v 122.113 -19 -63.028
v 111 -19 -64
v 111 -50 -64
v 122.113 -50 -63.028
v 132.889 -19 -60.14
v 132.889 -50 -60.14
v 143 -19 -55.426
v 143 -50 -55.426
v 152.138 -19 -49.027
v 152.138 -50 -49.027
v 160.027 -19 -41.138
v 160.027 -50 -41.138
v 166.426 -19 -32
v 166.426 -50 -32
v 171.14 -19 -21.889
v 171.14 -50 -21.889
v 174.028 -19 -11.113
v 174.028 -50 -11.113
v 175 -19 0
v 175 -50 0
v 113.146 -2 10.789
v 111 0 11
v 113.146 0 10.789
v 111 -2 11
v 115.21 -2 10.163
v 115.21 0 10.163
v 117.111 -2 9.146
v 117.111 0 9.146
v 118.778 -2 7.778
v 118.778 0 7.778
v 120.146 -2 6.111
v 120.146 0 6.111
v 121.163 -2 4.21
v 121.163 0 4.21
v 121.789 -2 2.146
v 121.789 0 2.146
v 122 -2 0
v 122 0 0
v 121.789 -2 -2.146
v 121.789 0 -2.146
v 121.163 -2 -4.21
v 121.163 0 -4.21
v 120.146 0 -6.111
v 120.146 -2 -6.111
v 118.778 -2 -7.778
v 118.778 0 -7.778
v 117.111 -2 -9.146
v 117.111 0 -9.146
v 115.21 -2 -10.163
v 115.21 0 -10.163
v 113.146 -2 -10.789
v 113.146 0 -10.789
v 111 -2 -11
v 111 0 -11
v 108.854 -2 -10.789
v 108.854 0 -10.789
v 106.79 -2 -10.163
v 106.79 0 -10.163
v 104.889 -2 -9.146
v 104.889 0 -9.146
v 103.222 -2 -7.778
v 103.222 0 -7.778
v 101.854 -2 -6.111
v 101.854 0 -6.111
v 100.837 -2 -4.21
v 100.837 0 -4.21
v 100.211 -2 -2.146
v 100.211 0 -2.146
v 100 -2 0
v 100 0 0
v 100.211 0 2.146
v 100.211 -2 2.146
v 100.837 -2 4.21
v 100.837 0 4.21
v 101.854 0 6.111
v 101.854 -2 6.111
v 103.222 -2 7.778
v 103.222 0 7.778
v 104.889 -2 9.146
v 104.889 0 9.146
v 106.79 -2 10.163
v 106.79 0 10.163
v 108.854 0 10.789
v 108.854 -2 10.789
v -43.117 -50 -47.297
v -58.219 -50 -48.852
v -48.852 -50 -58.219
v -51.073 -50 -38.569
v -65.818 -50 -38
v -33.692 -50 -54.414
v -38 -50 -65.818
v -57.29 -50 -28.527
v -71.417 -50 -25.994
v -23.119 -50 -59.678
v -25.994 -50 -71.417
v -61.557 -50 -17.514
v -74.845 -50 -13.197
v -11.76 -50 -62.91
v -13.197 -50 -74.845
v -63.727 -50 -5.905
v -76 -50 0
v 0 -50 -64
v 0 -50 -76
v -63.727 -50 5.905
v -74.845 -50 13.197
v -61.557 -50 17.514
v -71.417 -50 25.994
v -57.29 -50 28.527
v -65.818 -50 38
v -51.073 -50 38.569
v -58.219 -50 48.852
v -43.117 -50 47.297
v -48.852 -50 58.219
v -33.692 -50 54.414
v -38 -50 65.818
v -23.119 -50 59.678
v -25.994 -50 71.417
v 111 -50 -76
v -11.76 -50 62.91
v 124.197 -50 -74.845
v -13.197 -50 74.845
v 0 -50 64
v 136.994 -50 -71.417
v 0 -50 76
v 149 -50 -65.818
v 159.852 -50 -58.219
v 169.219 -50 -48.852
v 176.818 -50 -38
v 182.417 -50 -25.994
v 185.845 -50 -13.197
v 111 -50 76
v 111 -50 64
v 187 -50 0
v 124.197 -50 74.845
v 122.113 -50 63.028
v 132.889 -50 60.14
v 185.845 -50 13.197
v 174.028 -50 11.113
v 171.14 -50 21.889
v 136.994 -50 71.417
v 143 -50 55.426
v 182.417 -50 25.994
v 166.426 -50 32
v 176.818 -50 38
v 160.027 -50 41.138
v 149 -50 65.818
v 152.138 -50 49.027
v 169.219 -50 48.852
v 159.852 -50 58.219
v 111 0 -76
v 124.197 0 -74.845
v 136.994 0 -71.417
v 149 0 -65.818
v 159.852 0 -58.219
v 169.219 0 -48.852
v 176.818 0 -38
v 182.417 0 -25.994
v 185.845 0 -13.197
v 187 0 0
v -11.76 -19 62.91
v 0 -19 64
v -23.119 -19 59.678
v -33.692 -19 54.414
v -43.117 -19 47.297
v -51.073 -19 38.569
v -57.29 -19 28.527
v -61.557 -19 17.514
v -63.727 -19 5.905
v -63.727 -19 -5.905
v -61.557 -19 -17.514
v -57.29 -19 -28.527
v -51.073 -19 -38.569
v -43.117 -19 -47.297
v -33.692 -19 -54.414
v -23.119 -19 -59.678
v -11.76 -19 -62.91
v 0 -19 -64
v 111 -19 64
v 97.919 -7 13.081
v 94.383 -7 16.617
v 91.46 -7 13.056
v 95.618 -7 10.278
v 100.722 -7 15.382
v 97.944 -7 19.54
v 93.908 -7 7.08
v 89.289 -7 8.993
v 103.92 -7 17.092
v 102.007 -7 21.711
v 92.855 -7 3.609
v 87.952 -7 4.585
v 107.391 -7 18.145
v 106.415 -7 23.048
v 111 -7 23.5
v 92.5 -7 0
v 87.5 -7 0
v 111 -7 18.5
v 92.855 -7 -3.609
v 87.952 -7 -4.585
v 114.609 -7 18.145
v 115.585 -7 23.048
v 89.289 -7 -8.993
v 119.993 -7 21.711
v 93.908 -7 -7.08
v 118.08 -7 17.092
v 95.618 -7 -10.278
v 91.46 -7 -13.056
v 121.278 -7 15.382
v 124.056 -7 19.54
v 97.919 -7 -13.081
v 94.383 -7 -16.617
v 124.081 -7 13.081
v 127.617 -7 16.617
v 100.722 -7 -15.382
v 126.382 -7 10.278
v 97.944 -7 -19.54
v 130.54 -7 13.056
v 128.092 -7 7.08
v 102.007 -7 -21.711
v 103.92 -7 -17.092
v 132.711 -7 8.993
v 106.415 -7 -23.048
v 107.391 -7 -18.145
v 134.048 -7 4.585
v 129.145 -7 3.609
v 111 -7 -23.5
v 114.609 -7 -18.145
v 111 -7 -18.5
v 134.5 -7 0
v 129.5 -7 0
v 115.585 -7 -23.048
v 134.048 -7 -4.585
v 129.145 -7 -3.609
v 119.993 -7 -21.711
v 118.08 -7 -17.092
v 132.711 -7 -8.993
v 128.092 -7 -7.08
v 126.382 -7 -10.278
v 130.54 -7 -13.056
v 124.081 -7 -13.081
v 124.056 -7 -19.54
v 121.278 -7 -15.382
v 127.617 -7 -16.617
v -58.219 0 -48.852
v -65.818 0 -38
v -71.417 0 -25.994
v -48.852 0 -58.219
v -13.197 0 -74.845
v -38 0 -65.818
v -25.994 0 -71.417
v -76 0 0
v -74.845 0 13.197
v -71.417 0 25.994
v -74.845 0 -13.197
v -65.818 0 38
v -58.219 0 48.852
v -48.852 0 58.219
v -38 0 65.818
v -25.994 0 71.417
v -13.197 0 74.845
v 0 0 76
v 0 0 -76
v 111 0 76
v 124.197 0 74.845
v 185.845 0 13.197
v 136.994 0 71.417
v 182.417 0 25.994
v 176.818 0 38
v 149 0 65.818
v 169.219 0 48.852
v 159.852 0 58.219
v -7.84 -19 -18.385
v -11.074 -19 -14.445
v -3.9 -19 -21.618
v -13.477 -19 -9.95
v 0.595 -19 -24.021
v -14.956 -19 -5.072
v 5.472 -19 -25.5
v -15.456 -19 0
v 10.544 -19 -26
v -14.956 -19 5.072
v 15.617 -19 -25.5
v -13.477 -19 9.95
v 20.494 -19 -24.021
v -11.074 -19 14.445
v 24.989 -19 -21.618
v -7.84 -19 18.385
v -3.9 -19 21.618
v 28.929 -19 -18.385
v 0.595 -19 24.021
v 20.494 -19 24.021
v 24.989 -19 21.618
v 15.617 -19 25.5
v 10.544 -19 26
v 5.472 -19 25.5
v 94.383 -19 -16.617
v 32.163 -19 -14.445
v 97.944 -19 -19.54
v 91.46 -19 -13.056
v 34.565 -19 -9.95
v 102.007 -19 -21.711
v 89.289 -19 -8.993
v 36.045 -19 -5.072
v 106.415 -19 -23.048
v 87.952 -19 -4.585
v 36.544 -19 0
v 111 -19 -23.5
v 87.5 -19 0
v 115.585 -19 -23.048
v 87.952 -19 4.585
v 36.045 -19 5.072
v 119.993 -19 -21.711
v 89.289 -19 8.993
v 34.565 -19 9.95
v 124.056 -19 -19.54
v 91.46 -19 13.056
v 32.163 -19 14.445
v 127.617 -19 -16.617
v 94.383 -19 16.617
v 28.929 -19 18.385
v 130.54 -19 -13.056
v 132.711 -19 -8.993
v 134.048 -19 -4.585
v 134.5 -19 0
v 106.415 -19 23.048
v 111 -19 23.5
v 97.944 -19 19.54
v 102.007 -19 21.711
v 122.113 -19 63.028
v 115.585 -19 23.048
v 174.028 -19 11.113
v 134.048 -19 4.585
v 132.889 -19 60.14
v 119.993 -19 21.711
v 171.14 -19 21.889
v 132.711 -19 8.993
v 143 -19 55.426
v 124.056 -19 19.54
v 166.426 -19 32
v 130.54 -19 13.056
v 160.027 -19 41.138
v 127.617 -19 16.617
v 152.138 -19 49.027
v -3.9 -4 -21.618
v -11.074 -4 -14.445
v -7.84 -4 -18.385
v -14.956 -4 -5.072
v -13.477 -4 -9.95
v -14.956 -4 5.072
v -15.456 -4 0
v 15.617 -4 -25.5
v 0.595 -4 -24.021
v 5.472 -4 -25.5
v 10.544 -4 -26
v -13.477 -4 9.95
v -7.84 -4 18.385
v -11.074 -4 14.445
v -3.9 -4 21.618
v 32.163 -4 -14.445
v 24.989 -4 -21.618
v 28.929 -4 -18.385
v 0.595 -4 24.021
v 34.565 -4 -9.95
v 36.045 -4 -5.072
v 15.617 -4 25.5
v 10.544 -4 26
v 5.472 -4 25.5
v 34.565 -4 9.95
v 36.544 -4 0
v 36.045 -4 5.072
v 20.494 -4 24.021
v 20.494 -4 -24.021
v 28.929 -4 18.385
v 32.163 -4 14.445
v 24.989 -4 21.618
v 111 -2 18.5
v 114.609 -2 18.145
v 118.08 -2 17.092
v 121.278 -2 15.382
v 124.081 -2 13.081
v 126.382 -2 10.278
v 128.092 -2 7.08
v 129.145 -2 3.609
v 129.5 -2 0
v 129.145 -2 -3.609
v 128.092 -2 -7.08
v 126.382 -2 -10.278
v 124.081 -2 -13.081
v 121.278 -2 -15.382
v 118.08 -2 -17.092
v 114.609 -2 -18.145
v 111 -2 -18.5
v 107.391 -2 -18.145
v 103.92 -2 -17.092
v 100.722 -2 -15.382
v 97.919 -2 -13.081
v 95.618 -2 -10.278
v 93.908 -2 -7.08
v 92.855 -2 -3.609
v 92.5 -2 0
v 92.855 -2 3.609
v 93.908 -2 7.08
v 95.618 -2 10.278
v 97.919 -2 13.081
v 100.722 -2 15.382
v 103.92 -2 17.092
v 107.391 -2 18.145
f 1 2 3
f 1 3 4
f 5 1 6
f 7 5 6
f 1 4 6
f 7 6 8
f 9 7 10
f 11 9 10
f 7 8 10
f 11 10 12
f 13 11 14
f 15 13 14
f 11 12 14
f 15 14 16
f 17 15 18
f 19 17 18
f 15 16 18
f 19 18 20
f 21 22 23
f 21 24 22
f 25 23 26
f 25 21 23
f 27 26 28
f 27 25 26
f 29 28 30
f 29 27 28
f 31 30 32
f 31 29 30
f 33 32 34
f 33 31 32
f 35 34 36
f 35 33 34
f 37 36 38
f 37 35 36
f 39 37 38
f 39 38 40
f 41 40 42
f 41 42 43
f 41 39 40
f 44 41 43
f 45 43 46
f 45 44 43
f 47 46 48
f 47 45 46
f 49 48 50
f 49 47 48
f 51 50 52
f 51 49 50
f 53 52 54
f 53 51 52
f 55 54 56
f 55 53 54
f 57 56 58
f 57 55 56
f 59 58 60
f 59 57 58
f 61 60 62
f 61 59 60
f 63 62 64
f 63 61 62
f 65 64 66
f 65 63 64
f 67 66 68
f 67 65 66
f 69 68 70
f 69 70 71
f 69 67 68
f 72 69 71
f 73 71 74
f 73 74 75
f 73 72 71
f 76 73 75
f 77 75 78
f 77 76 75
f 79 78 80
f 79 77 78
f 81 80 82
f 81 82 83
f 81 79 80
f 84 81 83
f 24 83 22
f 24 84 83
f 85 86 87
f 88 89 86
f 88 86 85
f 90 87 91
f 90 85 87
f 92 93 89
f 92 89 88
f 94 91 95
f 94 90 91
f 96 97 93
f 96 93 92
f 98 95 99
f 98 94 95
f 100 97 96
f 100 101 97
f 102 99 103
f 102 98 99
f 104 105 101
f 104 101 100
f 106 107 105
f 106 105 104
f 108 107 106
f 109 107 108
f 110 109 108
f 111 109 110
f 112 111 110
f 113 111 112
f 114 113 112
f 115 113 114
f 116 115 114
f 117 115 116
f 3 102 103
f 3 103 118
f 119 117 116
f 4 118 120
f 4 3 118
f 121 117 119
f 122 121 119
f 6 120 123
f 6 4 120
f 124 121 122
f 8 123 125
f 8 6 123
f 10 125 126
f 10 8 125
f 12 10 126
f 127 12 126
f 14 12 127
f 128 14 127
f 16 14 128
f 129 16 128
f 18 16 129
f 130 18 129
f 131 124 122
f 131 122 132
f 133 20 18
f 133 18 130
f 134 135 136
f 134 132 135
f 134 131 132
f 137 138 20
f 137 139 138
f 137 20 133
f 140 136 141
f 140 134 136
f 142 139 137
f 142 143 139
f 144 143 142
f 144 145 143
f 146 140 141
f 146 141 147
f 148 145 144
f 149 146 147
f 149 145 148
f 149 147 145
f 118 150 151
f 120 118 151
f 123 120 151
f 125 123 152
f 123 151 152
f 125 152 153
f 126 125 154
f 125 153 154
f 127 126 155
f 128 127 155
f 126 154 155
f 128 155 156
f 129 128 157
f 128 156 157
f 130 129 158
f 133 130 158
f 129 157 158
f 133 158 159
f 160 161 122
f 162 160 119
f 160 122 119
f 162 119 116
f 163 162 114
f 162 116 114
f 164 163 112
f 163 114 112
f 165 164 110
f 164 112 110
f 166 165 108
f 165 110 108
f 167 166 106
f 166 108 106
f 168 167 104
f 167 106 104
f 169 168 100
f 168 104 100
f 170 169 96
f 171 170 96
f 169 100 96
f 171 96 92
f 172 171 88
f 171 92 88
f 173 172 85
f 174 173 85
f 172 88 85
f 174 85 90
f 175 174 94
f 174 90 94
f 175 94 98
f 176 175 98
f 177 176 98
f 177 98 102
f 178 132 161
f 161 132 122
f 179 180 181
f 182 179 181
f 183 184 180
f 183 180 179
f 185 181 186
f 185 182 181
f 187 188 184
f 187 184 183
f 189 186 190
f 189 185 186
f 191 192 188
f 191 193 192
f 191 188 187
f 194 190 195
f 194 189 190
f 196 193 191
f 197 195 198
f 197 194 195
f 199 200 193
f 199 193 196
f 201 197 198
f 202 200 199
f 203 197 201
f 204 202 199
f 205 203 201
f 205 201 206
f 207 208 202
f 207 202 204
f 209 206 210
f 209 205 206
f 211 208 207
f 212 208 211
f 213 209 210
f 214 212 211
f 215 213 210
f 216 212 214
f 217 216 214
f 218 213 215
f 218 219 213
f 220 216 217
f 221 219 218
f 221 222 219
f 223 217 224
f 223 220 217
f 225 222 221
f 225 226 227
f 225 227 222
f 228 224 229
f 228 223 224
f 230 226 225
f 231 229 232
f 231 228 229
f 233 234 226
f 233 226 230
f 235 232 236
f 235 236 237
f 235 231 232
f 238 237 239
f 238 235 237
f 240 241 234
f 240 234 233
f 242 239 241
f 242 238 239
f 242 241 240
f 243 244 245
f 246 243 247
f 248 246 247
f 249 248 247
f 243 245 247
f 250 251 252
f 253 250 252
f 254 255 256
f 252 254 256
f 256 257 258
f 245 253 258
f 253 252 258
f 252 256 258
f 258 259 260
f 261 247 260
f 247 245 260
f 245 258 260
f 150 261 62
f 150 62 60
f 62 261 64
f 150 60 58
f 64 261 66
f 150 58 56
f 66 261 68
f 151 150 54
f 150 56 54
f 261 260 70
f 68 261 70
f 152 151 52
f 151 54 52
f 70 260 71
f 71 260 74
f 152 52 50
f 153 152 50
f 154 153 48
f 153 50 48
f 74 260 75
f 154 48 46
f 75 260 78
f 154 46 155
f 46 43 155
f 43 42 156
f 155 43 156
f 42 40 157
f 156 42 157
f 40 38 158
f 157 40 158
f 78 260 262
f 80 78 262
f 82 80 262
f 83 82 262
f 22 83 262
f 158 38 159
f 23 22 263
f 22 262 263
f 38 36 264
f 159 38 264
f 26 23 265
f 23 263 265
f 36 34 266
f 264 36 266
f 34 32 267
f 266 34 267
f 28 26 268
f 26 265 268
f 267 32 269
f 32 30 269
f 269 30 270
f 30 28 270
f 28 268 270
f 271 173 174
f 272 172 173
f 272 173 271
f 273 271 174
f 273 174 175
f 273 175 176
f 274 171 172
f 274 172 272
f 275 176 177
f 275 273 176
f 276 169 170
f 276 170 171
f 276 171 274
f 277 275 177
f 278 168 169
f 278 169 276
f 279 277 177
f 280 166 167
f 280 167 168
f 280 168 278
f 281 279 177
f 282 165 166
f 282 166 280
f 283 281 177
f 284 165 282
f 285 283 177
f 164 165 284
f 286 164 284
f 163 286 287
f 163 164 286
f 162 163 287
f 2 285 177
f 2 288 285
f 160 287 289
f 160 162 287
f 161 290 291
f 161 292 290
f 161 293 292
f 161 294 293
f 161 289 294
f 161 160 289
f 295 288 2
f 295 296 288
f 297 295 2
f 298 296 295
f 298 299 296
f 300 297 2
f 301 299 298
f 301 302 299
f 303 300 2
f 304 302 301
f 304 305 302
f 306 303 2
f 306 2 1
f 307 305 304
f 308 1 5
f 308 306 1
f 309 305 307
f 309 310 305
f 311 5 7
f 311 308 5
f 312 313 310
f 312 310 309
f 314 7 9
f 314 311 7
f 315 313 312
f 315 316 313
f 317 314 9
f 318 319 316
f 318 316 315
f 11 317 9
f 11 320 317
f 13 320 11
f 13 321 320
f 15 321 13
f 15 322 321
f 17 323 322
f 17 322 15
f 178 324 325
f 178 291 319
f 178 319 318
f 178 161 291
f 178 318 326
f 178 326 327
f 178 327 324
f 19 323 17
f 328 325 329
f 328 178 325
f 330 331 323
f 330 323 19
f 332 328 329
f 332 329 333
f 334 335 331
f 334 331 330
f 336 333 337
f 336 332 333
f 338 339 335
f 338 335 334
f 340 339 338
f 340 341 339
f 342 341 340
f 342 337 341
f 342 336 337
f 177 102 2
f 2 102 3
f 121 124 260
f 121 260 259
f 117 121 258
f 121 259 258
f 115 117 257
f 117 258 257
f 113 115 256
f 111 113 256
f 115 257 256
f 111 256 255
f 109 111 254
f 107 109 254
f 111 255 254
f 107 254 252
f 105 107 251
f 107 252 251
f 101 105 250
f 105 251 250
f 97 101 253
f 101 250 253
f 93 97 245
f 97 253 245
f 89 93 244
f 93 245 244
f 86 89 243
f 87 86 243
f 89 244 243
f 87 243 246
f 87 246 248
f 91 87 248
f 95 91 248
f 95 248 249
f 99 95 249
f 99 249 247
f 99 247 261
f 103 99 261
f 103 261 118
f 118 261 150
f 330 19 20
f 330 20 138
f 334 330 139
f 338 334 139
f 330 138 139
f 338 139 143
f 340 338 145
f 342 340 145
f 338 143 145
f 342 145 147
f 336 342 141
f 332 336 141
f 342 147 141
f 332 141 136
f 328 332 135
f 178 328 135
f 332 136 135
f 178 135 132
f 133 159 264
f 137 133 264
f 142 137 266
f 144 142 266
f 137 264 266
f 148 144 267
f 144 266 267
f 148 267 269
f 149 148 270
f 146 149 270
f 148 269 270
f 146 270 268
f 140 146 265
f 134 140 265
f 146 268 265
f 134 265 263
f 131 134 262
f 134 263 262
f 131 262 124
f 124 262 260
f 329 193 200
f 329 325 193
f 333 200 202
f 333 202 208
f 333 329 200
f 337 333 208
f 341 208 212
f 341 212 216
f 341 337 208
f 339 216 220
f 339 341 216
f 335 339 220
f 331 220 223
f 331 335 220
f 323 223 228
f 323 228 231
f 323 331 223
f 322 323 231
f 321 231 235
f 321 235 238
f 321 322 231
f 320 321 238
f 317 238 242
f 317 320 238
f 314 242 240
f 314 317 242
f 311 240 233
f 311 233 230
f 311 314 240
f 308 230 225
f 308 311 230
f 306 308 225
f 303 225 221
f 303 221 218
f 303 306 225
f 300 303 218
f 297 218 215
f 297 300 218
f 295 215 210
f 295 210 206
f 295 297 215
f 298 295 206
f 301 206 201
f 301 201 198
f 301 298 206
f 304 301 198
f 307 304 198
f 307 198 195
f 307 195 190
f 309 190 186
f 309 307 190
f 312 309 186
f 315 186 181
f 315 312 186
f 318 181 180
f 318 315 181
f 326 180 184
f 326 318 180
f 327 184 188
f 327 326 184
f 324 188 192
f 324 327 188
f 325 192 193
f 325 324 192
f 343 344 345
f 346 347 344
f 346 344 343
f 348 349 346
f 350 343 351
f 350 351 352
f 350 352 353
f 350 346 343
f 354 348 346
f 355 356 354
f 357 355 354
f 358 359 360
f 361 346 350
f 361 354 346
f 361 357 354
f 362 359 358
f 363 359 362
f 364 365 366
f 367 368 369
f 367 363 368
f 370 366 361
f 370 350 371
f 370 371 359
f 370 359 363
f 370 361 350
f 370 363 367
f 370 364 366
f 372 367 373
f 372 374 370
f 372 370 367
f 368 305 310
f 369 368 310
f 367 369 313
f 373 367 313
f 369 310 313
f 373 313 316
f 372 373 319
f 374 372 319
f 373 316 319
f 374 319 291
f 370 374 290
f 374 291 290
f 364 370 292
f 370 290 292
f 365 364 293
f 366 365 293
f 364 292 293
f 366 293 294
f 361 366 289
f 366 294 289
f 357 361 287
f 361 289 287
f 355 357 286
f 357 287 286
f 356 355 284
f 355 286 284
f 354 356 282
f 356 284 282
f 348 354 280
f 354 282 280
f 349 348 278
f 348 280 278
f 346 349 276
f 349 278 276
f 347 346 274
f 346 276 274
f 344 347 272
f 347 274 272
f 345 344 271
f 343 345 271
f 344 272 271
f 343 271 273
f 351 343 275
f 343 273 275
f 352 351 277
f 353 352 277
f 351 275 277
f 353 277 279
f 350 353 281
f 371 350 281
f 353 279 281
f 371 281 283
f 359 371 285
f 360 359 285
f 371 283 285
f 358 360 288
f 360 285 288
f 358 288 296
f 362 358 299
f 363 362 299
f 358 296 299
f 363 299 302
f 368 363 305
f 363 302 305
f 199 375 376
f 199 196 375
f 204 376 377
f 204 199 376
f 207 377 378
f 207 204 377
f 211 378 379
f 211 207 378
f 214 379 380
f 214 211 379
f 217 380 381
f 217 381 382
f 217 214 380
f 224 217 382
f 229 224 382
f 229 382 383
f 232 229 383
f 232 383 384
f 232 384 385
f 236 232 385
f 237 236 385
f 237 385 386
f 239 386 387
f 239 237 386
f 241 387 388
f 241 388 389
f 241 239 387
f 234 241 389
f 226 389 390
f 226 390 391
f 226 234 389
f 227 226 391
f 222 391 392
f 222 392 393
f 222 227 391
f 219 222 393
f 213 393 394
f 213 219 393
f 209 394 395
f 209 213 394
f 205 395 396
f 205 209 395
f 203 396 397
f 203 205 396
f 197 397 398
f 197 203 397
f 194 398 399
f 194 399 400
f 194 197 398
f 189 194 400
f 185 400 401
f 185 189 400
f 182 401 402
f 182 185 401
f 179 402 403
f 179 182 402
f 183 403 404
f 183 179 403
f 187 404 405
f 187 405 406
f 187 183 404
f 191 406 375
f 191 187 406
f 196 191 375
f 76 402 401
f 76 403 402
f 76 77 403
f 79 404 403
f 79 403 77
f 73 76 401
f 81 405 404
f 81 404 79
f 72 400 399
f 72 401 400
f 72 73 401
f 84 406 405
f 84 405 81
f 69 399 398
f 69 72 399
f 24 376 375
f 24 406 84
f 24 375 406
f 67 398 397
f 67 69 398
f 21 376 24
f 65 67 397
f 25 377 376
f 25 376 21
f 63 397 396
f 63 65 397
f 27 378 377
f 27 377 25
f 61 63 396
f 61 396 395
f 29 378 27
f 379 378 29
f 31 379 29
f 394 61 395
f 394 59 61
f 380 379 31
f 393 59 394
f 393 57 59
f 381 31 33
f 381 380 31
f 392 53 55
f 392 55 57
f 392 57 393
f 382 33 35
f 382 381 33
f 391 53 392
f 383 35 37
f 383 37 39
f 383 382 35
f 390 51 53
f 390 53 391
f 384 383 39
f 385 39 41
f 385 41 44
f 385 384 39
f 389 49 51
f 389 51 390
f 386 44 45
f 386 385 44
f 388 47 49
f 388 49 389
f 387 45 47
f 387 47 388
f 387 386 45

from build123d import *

# Parameters (mm, degrees)
F1_DEPTH = 50
F3_DEPTH = 31
F4_R     = 26
F5_DEPTH = 15


with BuildPart() as f1:
    # F0 (on Front) → F1 (new body)
    with BuildSketch(Plane.XZ):
        with BuildLine():
            ThreePointArc((55.5, 51.9206124771), (30.2492433933, 69.7207521053), (0, 76))
            ThreePointArc((0, 76), (-76, 0), (0, -76))
            ThreePointArc((0, -76), (30.2492433933, -69.7207521053), (55.5, -51.9206124771))
            ThreePointArc((55.5, -51.9206124771), (35, 0), (55.5, 51.9206124771))
        make_face()
        with BuildLine():
            Line((111, 76), (0, 76))
            ThreePointArc((0, 76), (30.2492433933, 69.7207521053), (55.5, 51.9206124771))
            ThreePointArc((55.5, 51.9206124771), (80.7507566067, 69.7207521053), (111, 76))
        make_face()
        with BuildLine():
            ThreePointArc((55.5, -51.9206124771), (30.2492433933, -69.7207521053), (0, -76))
            Line((0, -76), (111, -76))
            ThreePointArc((111, -76), (80.7507566067, -69.7207521053), (55.5, -51.9206124771))
        make_face()
        with BuildLine():
            ThreePointArc((111, 76), (80.7507566067, 69.7207521053), (55.5, 51.9206124771))
            ThreePointArc((55.5, 51.9206124771), (70.6894617323, 27.9105714739), (76, 0))
            ThreePointArc((76, 0), (70.6894617323, -27.9105714739), (55.5, -51.9206124771))
            ThreePointArc((55.5, -51.9206124771), (80.7507566067, -69.7207521053), (111, -76))
            ThreePointArc((111, -76), (164.7401153702, -53.7401153702), (187, 0))
            ThreePointArc((187, 0), (164.7401153702, 53.7401153702), (111, 76))
        make_face()
        with BuildLine():
            ThreePointArc((76, 0), (70.6894617323, 27.9105714739), (55.5, 51.9206124771))
            ThreePointArc((55.5, 51.9206124771), (35, 0), (55.5, -51.9206124771))
            ThreePointArc((55.5, -51.9206124771), (70.6894617323, -27.9105714739), (76, 0))
        make_face()
    extrude(amount=F1_DEPTH)

    # F2 (on face) → F3 (cut)
    with BuildSketch(Plane.XZ.offset(50)):
        with BuildLine():
            ThreePointArc((55.5, 31.870833061), (32.0645184285, 55.3883260078), (0, 64))
            ThreePointArc((0, 64), (-64, 0), (0, -64))
            ThreePointArc((0, -64), (32.0645184285, -55.3883260078), (55.5, -31.870833061))
            ThreePointArc((55.5, -31.870833061), (47, 0), (55.5, 31.870833061))
        make_face()
        with BuildLine():
            Line((111, 64), (0, 64))
            ThreePointArc((0, 64), (32.0645184285, 55.3883260078), (55.5, 31.870833061))
            ThreePointArc((55.5, 31.870833061), (78.9354815715, 55.3883260078), (111, 64))
        make_face()
        with BuildLine():
            ThreePointArc((55.5, -31.870833061), (32.0645184285, -55.3883260078), (0, -64))
            Line((0, -64), (111, -64))
            ThreePointArc((111, -64), (78.9354815715, -55.3883260078), (55.5, -31.870833061))
        make_face()
        with BuildLine():
            ThreePointArc((111, 64), (78.9354815715, 55.3883260078), (55.5, 31.870833061))
            ThreePointArc((55.5, 31.870833061), (61.838499335, 16.4924225025), (64, 0))
            ThreePointArc((64, 0), (61.838499335, -16.4924225025), (55.5, -31.870833061))
            ThreePointArc((55.5, -31.870833061), (78.9354815715, -55.3883260078), (111, -64))
            ThreePointArc((111, -64), (156.2548339959, -45.2548339959), (175, 0))
            ThreePointArc((175, 0), (156.2548339959, 45.2548339959), (111, 64))
        make_face()
        with BuildLine():
            ThreePointArc((64, 0), (61.838499335, 16.4924225025), (55.5, 31.870833061))
            ThreePointArc((55.5, 31.870833061), (47, 0), (55.5, -31.870833061))
            ThreePointArc((55.5, -31.870833061), (61.838499335, -16.4924225025), (64, 0))
        make_face()
    extrude(amount=-F3_DEPTH, mode=Mode.SUBTRACT)

    # F4 (on face) → F5 (cut)
    with BuildSketch(Plane.XZ.offset(19)):
        with Locations((10.5443401262, 0)):
            Circle(F4_R)
    extrude(amount=-F5_DEPTH, mode=Mode.SUBTRACT)

    # F7 (on offset) → F8 (revolve, cut)
    with BuildSketch(Plane.YZ.offset(111)):
        Polygon((0, 0), (0, 11), (-2, 11), (-2, 18.5), (-7, 18.5), (-7, 23.5), (-19, 23.5), (-19, 0), align=None)
    revolve(axis=Axis((111, -17.0189570636, 0), (0, 1, 0)), mode=Mode.SUBTRACT)


solid = f1.part
